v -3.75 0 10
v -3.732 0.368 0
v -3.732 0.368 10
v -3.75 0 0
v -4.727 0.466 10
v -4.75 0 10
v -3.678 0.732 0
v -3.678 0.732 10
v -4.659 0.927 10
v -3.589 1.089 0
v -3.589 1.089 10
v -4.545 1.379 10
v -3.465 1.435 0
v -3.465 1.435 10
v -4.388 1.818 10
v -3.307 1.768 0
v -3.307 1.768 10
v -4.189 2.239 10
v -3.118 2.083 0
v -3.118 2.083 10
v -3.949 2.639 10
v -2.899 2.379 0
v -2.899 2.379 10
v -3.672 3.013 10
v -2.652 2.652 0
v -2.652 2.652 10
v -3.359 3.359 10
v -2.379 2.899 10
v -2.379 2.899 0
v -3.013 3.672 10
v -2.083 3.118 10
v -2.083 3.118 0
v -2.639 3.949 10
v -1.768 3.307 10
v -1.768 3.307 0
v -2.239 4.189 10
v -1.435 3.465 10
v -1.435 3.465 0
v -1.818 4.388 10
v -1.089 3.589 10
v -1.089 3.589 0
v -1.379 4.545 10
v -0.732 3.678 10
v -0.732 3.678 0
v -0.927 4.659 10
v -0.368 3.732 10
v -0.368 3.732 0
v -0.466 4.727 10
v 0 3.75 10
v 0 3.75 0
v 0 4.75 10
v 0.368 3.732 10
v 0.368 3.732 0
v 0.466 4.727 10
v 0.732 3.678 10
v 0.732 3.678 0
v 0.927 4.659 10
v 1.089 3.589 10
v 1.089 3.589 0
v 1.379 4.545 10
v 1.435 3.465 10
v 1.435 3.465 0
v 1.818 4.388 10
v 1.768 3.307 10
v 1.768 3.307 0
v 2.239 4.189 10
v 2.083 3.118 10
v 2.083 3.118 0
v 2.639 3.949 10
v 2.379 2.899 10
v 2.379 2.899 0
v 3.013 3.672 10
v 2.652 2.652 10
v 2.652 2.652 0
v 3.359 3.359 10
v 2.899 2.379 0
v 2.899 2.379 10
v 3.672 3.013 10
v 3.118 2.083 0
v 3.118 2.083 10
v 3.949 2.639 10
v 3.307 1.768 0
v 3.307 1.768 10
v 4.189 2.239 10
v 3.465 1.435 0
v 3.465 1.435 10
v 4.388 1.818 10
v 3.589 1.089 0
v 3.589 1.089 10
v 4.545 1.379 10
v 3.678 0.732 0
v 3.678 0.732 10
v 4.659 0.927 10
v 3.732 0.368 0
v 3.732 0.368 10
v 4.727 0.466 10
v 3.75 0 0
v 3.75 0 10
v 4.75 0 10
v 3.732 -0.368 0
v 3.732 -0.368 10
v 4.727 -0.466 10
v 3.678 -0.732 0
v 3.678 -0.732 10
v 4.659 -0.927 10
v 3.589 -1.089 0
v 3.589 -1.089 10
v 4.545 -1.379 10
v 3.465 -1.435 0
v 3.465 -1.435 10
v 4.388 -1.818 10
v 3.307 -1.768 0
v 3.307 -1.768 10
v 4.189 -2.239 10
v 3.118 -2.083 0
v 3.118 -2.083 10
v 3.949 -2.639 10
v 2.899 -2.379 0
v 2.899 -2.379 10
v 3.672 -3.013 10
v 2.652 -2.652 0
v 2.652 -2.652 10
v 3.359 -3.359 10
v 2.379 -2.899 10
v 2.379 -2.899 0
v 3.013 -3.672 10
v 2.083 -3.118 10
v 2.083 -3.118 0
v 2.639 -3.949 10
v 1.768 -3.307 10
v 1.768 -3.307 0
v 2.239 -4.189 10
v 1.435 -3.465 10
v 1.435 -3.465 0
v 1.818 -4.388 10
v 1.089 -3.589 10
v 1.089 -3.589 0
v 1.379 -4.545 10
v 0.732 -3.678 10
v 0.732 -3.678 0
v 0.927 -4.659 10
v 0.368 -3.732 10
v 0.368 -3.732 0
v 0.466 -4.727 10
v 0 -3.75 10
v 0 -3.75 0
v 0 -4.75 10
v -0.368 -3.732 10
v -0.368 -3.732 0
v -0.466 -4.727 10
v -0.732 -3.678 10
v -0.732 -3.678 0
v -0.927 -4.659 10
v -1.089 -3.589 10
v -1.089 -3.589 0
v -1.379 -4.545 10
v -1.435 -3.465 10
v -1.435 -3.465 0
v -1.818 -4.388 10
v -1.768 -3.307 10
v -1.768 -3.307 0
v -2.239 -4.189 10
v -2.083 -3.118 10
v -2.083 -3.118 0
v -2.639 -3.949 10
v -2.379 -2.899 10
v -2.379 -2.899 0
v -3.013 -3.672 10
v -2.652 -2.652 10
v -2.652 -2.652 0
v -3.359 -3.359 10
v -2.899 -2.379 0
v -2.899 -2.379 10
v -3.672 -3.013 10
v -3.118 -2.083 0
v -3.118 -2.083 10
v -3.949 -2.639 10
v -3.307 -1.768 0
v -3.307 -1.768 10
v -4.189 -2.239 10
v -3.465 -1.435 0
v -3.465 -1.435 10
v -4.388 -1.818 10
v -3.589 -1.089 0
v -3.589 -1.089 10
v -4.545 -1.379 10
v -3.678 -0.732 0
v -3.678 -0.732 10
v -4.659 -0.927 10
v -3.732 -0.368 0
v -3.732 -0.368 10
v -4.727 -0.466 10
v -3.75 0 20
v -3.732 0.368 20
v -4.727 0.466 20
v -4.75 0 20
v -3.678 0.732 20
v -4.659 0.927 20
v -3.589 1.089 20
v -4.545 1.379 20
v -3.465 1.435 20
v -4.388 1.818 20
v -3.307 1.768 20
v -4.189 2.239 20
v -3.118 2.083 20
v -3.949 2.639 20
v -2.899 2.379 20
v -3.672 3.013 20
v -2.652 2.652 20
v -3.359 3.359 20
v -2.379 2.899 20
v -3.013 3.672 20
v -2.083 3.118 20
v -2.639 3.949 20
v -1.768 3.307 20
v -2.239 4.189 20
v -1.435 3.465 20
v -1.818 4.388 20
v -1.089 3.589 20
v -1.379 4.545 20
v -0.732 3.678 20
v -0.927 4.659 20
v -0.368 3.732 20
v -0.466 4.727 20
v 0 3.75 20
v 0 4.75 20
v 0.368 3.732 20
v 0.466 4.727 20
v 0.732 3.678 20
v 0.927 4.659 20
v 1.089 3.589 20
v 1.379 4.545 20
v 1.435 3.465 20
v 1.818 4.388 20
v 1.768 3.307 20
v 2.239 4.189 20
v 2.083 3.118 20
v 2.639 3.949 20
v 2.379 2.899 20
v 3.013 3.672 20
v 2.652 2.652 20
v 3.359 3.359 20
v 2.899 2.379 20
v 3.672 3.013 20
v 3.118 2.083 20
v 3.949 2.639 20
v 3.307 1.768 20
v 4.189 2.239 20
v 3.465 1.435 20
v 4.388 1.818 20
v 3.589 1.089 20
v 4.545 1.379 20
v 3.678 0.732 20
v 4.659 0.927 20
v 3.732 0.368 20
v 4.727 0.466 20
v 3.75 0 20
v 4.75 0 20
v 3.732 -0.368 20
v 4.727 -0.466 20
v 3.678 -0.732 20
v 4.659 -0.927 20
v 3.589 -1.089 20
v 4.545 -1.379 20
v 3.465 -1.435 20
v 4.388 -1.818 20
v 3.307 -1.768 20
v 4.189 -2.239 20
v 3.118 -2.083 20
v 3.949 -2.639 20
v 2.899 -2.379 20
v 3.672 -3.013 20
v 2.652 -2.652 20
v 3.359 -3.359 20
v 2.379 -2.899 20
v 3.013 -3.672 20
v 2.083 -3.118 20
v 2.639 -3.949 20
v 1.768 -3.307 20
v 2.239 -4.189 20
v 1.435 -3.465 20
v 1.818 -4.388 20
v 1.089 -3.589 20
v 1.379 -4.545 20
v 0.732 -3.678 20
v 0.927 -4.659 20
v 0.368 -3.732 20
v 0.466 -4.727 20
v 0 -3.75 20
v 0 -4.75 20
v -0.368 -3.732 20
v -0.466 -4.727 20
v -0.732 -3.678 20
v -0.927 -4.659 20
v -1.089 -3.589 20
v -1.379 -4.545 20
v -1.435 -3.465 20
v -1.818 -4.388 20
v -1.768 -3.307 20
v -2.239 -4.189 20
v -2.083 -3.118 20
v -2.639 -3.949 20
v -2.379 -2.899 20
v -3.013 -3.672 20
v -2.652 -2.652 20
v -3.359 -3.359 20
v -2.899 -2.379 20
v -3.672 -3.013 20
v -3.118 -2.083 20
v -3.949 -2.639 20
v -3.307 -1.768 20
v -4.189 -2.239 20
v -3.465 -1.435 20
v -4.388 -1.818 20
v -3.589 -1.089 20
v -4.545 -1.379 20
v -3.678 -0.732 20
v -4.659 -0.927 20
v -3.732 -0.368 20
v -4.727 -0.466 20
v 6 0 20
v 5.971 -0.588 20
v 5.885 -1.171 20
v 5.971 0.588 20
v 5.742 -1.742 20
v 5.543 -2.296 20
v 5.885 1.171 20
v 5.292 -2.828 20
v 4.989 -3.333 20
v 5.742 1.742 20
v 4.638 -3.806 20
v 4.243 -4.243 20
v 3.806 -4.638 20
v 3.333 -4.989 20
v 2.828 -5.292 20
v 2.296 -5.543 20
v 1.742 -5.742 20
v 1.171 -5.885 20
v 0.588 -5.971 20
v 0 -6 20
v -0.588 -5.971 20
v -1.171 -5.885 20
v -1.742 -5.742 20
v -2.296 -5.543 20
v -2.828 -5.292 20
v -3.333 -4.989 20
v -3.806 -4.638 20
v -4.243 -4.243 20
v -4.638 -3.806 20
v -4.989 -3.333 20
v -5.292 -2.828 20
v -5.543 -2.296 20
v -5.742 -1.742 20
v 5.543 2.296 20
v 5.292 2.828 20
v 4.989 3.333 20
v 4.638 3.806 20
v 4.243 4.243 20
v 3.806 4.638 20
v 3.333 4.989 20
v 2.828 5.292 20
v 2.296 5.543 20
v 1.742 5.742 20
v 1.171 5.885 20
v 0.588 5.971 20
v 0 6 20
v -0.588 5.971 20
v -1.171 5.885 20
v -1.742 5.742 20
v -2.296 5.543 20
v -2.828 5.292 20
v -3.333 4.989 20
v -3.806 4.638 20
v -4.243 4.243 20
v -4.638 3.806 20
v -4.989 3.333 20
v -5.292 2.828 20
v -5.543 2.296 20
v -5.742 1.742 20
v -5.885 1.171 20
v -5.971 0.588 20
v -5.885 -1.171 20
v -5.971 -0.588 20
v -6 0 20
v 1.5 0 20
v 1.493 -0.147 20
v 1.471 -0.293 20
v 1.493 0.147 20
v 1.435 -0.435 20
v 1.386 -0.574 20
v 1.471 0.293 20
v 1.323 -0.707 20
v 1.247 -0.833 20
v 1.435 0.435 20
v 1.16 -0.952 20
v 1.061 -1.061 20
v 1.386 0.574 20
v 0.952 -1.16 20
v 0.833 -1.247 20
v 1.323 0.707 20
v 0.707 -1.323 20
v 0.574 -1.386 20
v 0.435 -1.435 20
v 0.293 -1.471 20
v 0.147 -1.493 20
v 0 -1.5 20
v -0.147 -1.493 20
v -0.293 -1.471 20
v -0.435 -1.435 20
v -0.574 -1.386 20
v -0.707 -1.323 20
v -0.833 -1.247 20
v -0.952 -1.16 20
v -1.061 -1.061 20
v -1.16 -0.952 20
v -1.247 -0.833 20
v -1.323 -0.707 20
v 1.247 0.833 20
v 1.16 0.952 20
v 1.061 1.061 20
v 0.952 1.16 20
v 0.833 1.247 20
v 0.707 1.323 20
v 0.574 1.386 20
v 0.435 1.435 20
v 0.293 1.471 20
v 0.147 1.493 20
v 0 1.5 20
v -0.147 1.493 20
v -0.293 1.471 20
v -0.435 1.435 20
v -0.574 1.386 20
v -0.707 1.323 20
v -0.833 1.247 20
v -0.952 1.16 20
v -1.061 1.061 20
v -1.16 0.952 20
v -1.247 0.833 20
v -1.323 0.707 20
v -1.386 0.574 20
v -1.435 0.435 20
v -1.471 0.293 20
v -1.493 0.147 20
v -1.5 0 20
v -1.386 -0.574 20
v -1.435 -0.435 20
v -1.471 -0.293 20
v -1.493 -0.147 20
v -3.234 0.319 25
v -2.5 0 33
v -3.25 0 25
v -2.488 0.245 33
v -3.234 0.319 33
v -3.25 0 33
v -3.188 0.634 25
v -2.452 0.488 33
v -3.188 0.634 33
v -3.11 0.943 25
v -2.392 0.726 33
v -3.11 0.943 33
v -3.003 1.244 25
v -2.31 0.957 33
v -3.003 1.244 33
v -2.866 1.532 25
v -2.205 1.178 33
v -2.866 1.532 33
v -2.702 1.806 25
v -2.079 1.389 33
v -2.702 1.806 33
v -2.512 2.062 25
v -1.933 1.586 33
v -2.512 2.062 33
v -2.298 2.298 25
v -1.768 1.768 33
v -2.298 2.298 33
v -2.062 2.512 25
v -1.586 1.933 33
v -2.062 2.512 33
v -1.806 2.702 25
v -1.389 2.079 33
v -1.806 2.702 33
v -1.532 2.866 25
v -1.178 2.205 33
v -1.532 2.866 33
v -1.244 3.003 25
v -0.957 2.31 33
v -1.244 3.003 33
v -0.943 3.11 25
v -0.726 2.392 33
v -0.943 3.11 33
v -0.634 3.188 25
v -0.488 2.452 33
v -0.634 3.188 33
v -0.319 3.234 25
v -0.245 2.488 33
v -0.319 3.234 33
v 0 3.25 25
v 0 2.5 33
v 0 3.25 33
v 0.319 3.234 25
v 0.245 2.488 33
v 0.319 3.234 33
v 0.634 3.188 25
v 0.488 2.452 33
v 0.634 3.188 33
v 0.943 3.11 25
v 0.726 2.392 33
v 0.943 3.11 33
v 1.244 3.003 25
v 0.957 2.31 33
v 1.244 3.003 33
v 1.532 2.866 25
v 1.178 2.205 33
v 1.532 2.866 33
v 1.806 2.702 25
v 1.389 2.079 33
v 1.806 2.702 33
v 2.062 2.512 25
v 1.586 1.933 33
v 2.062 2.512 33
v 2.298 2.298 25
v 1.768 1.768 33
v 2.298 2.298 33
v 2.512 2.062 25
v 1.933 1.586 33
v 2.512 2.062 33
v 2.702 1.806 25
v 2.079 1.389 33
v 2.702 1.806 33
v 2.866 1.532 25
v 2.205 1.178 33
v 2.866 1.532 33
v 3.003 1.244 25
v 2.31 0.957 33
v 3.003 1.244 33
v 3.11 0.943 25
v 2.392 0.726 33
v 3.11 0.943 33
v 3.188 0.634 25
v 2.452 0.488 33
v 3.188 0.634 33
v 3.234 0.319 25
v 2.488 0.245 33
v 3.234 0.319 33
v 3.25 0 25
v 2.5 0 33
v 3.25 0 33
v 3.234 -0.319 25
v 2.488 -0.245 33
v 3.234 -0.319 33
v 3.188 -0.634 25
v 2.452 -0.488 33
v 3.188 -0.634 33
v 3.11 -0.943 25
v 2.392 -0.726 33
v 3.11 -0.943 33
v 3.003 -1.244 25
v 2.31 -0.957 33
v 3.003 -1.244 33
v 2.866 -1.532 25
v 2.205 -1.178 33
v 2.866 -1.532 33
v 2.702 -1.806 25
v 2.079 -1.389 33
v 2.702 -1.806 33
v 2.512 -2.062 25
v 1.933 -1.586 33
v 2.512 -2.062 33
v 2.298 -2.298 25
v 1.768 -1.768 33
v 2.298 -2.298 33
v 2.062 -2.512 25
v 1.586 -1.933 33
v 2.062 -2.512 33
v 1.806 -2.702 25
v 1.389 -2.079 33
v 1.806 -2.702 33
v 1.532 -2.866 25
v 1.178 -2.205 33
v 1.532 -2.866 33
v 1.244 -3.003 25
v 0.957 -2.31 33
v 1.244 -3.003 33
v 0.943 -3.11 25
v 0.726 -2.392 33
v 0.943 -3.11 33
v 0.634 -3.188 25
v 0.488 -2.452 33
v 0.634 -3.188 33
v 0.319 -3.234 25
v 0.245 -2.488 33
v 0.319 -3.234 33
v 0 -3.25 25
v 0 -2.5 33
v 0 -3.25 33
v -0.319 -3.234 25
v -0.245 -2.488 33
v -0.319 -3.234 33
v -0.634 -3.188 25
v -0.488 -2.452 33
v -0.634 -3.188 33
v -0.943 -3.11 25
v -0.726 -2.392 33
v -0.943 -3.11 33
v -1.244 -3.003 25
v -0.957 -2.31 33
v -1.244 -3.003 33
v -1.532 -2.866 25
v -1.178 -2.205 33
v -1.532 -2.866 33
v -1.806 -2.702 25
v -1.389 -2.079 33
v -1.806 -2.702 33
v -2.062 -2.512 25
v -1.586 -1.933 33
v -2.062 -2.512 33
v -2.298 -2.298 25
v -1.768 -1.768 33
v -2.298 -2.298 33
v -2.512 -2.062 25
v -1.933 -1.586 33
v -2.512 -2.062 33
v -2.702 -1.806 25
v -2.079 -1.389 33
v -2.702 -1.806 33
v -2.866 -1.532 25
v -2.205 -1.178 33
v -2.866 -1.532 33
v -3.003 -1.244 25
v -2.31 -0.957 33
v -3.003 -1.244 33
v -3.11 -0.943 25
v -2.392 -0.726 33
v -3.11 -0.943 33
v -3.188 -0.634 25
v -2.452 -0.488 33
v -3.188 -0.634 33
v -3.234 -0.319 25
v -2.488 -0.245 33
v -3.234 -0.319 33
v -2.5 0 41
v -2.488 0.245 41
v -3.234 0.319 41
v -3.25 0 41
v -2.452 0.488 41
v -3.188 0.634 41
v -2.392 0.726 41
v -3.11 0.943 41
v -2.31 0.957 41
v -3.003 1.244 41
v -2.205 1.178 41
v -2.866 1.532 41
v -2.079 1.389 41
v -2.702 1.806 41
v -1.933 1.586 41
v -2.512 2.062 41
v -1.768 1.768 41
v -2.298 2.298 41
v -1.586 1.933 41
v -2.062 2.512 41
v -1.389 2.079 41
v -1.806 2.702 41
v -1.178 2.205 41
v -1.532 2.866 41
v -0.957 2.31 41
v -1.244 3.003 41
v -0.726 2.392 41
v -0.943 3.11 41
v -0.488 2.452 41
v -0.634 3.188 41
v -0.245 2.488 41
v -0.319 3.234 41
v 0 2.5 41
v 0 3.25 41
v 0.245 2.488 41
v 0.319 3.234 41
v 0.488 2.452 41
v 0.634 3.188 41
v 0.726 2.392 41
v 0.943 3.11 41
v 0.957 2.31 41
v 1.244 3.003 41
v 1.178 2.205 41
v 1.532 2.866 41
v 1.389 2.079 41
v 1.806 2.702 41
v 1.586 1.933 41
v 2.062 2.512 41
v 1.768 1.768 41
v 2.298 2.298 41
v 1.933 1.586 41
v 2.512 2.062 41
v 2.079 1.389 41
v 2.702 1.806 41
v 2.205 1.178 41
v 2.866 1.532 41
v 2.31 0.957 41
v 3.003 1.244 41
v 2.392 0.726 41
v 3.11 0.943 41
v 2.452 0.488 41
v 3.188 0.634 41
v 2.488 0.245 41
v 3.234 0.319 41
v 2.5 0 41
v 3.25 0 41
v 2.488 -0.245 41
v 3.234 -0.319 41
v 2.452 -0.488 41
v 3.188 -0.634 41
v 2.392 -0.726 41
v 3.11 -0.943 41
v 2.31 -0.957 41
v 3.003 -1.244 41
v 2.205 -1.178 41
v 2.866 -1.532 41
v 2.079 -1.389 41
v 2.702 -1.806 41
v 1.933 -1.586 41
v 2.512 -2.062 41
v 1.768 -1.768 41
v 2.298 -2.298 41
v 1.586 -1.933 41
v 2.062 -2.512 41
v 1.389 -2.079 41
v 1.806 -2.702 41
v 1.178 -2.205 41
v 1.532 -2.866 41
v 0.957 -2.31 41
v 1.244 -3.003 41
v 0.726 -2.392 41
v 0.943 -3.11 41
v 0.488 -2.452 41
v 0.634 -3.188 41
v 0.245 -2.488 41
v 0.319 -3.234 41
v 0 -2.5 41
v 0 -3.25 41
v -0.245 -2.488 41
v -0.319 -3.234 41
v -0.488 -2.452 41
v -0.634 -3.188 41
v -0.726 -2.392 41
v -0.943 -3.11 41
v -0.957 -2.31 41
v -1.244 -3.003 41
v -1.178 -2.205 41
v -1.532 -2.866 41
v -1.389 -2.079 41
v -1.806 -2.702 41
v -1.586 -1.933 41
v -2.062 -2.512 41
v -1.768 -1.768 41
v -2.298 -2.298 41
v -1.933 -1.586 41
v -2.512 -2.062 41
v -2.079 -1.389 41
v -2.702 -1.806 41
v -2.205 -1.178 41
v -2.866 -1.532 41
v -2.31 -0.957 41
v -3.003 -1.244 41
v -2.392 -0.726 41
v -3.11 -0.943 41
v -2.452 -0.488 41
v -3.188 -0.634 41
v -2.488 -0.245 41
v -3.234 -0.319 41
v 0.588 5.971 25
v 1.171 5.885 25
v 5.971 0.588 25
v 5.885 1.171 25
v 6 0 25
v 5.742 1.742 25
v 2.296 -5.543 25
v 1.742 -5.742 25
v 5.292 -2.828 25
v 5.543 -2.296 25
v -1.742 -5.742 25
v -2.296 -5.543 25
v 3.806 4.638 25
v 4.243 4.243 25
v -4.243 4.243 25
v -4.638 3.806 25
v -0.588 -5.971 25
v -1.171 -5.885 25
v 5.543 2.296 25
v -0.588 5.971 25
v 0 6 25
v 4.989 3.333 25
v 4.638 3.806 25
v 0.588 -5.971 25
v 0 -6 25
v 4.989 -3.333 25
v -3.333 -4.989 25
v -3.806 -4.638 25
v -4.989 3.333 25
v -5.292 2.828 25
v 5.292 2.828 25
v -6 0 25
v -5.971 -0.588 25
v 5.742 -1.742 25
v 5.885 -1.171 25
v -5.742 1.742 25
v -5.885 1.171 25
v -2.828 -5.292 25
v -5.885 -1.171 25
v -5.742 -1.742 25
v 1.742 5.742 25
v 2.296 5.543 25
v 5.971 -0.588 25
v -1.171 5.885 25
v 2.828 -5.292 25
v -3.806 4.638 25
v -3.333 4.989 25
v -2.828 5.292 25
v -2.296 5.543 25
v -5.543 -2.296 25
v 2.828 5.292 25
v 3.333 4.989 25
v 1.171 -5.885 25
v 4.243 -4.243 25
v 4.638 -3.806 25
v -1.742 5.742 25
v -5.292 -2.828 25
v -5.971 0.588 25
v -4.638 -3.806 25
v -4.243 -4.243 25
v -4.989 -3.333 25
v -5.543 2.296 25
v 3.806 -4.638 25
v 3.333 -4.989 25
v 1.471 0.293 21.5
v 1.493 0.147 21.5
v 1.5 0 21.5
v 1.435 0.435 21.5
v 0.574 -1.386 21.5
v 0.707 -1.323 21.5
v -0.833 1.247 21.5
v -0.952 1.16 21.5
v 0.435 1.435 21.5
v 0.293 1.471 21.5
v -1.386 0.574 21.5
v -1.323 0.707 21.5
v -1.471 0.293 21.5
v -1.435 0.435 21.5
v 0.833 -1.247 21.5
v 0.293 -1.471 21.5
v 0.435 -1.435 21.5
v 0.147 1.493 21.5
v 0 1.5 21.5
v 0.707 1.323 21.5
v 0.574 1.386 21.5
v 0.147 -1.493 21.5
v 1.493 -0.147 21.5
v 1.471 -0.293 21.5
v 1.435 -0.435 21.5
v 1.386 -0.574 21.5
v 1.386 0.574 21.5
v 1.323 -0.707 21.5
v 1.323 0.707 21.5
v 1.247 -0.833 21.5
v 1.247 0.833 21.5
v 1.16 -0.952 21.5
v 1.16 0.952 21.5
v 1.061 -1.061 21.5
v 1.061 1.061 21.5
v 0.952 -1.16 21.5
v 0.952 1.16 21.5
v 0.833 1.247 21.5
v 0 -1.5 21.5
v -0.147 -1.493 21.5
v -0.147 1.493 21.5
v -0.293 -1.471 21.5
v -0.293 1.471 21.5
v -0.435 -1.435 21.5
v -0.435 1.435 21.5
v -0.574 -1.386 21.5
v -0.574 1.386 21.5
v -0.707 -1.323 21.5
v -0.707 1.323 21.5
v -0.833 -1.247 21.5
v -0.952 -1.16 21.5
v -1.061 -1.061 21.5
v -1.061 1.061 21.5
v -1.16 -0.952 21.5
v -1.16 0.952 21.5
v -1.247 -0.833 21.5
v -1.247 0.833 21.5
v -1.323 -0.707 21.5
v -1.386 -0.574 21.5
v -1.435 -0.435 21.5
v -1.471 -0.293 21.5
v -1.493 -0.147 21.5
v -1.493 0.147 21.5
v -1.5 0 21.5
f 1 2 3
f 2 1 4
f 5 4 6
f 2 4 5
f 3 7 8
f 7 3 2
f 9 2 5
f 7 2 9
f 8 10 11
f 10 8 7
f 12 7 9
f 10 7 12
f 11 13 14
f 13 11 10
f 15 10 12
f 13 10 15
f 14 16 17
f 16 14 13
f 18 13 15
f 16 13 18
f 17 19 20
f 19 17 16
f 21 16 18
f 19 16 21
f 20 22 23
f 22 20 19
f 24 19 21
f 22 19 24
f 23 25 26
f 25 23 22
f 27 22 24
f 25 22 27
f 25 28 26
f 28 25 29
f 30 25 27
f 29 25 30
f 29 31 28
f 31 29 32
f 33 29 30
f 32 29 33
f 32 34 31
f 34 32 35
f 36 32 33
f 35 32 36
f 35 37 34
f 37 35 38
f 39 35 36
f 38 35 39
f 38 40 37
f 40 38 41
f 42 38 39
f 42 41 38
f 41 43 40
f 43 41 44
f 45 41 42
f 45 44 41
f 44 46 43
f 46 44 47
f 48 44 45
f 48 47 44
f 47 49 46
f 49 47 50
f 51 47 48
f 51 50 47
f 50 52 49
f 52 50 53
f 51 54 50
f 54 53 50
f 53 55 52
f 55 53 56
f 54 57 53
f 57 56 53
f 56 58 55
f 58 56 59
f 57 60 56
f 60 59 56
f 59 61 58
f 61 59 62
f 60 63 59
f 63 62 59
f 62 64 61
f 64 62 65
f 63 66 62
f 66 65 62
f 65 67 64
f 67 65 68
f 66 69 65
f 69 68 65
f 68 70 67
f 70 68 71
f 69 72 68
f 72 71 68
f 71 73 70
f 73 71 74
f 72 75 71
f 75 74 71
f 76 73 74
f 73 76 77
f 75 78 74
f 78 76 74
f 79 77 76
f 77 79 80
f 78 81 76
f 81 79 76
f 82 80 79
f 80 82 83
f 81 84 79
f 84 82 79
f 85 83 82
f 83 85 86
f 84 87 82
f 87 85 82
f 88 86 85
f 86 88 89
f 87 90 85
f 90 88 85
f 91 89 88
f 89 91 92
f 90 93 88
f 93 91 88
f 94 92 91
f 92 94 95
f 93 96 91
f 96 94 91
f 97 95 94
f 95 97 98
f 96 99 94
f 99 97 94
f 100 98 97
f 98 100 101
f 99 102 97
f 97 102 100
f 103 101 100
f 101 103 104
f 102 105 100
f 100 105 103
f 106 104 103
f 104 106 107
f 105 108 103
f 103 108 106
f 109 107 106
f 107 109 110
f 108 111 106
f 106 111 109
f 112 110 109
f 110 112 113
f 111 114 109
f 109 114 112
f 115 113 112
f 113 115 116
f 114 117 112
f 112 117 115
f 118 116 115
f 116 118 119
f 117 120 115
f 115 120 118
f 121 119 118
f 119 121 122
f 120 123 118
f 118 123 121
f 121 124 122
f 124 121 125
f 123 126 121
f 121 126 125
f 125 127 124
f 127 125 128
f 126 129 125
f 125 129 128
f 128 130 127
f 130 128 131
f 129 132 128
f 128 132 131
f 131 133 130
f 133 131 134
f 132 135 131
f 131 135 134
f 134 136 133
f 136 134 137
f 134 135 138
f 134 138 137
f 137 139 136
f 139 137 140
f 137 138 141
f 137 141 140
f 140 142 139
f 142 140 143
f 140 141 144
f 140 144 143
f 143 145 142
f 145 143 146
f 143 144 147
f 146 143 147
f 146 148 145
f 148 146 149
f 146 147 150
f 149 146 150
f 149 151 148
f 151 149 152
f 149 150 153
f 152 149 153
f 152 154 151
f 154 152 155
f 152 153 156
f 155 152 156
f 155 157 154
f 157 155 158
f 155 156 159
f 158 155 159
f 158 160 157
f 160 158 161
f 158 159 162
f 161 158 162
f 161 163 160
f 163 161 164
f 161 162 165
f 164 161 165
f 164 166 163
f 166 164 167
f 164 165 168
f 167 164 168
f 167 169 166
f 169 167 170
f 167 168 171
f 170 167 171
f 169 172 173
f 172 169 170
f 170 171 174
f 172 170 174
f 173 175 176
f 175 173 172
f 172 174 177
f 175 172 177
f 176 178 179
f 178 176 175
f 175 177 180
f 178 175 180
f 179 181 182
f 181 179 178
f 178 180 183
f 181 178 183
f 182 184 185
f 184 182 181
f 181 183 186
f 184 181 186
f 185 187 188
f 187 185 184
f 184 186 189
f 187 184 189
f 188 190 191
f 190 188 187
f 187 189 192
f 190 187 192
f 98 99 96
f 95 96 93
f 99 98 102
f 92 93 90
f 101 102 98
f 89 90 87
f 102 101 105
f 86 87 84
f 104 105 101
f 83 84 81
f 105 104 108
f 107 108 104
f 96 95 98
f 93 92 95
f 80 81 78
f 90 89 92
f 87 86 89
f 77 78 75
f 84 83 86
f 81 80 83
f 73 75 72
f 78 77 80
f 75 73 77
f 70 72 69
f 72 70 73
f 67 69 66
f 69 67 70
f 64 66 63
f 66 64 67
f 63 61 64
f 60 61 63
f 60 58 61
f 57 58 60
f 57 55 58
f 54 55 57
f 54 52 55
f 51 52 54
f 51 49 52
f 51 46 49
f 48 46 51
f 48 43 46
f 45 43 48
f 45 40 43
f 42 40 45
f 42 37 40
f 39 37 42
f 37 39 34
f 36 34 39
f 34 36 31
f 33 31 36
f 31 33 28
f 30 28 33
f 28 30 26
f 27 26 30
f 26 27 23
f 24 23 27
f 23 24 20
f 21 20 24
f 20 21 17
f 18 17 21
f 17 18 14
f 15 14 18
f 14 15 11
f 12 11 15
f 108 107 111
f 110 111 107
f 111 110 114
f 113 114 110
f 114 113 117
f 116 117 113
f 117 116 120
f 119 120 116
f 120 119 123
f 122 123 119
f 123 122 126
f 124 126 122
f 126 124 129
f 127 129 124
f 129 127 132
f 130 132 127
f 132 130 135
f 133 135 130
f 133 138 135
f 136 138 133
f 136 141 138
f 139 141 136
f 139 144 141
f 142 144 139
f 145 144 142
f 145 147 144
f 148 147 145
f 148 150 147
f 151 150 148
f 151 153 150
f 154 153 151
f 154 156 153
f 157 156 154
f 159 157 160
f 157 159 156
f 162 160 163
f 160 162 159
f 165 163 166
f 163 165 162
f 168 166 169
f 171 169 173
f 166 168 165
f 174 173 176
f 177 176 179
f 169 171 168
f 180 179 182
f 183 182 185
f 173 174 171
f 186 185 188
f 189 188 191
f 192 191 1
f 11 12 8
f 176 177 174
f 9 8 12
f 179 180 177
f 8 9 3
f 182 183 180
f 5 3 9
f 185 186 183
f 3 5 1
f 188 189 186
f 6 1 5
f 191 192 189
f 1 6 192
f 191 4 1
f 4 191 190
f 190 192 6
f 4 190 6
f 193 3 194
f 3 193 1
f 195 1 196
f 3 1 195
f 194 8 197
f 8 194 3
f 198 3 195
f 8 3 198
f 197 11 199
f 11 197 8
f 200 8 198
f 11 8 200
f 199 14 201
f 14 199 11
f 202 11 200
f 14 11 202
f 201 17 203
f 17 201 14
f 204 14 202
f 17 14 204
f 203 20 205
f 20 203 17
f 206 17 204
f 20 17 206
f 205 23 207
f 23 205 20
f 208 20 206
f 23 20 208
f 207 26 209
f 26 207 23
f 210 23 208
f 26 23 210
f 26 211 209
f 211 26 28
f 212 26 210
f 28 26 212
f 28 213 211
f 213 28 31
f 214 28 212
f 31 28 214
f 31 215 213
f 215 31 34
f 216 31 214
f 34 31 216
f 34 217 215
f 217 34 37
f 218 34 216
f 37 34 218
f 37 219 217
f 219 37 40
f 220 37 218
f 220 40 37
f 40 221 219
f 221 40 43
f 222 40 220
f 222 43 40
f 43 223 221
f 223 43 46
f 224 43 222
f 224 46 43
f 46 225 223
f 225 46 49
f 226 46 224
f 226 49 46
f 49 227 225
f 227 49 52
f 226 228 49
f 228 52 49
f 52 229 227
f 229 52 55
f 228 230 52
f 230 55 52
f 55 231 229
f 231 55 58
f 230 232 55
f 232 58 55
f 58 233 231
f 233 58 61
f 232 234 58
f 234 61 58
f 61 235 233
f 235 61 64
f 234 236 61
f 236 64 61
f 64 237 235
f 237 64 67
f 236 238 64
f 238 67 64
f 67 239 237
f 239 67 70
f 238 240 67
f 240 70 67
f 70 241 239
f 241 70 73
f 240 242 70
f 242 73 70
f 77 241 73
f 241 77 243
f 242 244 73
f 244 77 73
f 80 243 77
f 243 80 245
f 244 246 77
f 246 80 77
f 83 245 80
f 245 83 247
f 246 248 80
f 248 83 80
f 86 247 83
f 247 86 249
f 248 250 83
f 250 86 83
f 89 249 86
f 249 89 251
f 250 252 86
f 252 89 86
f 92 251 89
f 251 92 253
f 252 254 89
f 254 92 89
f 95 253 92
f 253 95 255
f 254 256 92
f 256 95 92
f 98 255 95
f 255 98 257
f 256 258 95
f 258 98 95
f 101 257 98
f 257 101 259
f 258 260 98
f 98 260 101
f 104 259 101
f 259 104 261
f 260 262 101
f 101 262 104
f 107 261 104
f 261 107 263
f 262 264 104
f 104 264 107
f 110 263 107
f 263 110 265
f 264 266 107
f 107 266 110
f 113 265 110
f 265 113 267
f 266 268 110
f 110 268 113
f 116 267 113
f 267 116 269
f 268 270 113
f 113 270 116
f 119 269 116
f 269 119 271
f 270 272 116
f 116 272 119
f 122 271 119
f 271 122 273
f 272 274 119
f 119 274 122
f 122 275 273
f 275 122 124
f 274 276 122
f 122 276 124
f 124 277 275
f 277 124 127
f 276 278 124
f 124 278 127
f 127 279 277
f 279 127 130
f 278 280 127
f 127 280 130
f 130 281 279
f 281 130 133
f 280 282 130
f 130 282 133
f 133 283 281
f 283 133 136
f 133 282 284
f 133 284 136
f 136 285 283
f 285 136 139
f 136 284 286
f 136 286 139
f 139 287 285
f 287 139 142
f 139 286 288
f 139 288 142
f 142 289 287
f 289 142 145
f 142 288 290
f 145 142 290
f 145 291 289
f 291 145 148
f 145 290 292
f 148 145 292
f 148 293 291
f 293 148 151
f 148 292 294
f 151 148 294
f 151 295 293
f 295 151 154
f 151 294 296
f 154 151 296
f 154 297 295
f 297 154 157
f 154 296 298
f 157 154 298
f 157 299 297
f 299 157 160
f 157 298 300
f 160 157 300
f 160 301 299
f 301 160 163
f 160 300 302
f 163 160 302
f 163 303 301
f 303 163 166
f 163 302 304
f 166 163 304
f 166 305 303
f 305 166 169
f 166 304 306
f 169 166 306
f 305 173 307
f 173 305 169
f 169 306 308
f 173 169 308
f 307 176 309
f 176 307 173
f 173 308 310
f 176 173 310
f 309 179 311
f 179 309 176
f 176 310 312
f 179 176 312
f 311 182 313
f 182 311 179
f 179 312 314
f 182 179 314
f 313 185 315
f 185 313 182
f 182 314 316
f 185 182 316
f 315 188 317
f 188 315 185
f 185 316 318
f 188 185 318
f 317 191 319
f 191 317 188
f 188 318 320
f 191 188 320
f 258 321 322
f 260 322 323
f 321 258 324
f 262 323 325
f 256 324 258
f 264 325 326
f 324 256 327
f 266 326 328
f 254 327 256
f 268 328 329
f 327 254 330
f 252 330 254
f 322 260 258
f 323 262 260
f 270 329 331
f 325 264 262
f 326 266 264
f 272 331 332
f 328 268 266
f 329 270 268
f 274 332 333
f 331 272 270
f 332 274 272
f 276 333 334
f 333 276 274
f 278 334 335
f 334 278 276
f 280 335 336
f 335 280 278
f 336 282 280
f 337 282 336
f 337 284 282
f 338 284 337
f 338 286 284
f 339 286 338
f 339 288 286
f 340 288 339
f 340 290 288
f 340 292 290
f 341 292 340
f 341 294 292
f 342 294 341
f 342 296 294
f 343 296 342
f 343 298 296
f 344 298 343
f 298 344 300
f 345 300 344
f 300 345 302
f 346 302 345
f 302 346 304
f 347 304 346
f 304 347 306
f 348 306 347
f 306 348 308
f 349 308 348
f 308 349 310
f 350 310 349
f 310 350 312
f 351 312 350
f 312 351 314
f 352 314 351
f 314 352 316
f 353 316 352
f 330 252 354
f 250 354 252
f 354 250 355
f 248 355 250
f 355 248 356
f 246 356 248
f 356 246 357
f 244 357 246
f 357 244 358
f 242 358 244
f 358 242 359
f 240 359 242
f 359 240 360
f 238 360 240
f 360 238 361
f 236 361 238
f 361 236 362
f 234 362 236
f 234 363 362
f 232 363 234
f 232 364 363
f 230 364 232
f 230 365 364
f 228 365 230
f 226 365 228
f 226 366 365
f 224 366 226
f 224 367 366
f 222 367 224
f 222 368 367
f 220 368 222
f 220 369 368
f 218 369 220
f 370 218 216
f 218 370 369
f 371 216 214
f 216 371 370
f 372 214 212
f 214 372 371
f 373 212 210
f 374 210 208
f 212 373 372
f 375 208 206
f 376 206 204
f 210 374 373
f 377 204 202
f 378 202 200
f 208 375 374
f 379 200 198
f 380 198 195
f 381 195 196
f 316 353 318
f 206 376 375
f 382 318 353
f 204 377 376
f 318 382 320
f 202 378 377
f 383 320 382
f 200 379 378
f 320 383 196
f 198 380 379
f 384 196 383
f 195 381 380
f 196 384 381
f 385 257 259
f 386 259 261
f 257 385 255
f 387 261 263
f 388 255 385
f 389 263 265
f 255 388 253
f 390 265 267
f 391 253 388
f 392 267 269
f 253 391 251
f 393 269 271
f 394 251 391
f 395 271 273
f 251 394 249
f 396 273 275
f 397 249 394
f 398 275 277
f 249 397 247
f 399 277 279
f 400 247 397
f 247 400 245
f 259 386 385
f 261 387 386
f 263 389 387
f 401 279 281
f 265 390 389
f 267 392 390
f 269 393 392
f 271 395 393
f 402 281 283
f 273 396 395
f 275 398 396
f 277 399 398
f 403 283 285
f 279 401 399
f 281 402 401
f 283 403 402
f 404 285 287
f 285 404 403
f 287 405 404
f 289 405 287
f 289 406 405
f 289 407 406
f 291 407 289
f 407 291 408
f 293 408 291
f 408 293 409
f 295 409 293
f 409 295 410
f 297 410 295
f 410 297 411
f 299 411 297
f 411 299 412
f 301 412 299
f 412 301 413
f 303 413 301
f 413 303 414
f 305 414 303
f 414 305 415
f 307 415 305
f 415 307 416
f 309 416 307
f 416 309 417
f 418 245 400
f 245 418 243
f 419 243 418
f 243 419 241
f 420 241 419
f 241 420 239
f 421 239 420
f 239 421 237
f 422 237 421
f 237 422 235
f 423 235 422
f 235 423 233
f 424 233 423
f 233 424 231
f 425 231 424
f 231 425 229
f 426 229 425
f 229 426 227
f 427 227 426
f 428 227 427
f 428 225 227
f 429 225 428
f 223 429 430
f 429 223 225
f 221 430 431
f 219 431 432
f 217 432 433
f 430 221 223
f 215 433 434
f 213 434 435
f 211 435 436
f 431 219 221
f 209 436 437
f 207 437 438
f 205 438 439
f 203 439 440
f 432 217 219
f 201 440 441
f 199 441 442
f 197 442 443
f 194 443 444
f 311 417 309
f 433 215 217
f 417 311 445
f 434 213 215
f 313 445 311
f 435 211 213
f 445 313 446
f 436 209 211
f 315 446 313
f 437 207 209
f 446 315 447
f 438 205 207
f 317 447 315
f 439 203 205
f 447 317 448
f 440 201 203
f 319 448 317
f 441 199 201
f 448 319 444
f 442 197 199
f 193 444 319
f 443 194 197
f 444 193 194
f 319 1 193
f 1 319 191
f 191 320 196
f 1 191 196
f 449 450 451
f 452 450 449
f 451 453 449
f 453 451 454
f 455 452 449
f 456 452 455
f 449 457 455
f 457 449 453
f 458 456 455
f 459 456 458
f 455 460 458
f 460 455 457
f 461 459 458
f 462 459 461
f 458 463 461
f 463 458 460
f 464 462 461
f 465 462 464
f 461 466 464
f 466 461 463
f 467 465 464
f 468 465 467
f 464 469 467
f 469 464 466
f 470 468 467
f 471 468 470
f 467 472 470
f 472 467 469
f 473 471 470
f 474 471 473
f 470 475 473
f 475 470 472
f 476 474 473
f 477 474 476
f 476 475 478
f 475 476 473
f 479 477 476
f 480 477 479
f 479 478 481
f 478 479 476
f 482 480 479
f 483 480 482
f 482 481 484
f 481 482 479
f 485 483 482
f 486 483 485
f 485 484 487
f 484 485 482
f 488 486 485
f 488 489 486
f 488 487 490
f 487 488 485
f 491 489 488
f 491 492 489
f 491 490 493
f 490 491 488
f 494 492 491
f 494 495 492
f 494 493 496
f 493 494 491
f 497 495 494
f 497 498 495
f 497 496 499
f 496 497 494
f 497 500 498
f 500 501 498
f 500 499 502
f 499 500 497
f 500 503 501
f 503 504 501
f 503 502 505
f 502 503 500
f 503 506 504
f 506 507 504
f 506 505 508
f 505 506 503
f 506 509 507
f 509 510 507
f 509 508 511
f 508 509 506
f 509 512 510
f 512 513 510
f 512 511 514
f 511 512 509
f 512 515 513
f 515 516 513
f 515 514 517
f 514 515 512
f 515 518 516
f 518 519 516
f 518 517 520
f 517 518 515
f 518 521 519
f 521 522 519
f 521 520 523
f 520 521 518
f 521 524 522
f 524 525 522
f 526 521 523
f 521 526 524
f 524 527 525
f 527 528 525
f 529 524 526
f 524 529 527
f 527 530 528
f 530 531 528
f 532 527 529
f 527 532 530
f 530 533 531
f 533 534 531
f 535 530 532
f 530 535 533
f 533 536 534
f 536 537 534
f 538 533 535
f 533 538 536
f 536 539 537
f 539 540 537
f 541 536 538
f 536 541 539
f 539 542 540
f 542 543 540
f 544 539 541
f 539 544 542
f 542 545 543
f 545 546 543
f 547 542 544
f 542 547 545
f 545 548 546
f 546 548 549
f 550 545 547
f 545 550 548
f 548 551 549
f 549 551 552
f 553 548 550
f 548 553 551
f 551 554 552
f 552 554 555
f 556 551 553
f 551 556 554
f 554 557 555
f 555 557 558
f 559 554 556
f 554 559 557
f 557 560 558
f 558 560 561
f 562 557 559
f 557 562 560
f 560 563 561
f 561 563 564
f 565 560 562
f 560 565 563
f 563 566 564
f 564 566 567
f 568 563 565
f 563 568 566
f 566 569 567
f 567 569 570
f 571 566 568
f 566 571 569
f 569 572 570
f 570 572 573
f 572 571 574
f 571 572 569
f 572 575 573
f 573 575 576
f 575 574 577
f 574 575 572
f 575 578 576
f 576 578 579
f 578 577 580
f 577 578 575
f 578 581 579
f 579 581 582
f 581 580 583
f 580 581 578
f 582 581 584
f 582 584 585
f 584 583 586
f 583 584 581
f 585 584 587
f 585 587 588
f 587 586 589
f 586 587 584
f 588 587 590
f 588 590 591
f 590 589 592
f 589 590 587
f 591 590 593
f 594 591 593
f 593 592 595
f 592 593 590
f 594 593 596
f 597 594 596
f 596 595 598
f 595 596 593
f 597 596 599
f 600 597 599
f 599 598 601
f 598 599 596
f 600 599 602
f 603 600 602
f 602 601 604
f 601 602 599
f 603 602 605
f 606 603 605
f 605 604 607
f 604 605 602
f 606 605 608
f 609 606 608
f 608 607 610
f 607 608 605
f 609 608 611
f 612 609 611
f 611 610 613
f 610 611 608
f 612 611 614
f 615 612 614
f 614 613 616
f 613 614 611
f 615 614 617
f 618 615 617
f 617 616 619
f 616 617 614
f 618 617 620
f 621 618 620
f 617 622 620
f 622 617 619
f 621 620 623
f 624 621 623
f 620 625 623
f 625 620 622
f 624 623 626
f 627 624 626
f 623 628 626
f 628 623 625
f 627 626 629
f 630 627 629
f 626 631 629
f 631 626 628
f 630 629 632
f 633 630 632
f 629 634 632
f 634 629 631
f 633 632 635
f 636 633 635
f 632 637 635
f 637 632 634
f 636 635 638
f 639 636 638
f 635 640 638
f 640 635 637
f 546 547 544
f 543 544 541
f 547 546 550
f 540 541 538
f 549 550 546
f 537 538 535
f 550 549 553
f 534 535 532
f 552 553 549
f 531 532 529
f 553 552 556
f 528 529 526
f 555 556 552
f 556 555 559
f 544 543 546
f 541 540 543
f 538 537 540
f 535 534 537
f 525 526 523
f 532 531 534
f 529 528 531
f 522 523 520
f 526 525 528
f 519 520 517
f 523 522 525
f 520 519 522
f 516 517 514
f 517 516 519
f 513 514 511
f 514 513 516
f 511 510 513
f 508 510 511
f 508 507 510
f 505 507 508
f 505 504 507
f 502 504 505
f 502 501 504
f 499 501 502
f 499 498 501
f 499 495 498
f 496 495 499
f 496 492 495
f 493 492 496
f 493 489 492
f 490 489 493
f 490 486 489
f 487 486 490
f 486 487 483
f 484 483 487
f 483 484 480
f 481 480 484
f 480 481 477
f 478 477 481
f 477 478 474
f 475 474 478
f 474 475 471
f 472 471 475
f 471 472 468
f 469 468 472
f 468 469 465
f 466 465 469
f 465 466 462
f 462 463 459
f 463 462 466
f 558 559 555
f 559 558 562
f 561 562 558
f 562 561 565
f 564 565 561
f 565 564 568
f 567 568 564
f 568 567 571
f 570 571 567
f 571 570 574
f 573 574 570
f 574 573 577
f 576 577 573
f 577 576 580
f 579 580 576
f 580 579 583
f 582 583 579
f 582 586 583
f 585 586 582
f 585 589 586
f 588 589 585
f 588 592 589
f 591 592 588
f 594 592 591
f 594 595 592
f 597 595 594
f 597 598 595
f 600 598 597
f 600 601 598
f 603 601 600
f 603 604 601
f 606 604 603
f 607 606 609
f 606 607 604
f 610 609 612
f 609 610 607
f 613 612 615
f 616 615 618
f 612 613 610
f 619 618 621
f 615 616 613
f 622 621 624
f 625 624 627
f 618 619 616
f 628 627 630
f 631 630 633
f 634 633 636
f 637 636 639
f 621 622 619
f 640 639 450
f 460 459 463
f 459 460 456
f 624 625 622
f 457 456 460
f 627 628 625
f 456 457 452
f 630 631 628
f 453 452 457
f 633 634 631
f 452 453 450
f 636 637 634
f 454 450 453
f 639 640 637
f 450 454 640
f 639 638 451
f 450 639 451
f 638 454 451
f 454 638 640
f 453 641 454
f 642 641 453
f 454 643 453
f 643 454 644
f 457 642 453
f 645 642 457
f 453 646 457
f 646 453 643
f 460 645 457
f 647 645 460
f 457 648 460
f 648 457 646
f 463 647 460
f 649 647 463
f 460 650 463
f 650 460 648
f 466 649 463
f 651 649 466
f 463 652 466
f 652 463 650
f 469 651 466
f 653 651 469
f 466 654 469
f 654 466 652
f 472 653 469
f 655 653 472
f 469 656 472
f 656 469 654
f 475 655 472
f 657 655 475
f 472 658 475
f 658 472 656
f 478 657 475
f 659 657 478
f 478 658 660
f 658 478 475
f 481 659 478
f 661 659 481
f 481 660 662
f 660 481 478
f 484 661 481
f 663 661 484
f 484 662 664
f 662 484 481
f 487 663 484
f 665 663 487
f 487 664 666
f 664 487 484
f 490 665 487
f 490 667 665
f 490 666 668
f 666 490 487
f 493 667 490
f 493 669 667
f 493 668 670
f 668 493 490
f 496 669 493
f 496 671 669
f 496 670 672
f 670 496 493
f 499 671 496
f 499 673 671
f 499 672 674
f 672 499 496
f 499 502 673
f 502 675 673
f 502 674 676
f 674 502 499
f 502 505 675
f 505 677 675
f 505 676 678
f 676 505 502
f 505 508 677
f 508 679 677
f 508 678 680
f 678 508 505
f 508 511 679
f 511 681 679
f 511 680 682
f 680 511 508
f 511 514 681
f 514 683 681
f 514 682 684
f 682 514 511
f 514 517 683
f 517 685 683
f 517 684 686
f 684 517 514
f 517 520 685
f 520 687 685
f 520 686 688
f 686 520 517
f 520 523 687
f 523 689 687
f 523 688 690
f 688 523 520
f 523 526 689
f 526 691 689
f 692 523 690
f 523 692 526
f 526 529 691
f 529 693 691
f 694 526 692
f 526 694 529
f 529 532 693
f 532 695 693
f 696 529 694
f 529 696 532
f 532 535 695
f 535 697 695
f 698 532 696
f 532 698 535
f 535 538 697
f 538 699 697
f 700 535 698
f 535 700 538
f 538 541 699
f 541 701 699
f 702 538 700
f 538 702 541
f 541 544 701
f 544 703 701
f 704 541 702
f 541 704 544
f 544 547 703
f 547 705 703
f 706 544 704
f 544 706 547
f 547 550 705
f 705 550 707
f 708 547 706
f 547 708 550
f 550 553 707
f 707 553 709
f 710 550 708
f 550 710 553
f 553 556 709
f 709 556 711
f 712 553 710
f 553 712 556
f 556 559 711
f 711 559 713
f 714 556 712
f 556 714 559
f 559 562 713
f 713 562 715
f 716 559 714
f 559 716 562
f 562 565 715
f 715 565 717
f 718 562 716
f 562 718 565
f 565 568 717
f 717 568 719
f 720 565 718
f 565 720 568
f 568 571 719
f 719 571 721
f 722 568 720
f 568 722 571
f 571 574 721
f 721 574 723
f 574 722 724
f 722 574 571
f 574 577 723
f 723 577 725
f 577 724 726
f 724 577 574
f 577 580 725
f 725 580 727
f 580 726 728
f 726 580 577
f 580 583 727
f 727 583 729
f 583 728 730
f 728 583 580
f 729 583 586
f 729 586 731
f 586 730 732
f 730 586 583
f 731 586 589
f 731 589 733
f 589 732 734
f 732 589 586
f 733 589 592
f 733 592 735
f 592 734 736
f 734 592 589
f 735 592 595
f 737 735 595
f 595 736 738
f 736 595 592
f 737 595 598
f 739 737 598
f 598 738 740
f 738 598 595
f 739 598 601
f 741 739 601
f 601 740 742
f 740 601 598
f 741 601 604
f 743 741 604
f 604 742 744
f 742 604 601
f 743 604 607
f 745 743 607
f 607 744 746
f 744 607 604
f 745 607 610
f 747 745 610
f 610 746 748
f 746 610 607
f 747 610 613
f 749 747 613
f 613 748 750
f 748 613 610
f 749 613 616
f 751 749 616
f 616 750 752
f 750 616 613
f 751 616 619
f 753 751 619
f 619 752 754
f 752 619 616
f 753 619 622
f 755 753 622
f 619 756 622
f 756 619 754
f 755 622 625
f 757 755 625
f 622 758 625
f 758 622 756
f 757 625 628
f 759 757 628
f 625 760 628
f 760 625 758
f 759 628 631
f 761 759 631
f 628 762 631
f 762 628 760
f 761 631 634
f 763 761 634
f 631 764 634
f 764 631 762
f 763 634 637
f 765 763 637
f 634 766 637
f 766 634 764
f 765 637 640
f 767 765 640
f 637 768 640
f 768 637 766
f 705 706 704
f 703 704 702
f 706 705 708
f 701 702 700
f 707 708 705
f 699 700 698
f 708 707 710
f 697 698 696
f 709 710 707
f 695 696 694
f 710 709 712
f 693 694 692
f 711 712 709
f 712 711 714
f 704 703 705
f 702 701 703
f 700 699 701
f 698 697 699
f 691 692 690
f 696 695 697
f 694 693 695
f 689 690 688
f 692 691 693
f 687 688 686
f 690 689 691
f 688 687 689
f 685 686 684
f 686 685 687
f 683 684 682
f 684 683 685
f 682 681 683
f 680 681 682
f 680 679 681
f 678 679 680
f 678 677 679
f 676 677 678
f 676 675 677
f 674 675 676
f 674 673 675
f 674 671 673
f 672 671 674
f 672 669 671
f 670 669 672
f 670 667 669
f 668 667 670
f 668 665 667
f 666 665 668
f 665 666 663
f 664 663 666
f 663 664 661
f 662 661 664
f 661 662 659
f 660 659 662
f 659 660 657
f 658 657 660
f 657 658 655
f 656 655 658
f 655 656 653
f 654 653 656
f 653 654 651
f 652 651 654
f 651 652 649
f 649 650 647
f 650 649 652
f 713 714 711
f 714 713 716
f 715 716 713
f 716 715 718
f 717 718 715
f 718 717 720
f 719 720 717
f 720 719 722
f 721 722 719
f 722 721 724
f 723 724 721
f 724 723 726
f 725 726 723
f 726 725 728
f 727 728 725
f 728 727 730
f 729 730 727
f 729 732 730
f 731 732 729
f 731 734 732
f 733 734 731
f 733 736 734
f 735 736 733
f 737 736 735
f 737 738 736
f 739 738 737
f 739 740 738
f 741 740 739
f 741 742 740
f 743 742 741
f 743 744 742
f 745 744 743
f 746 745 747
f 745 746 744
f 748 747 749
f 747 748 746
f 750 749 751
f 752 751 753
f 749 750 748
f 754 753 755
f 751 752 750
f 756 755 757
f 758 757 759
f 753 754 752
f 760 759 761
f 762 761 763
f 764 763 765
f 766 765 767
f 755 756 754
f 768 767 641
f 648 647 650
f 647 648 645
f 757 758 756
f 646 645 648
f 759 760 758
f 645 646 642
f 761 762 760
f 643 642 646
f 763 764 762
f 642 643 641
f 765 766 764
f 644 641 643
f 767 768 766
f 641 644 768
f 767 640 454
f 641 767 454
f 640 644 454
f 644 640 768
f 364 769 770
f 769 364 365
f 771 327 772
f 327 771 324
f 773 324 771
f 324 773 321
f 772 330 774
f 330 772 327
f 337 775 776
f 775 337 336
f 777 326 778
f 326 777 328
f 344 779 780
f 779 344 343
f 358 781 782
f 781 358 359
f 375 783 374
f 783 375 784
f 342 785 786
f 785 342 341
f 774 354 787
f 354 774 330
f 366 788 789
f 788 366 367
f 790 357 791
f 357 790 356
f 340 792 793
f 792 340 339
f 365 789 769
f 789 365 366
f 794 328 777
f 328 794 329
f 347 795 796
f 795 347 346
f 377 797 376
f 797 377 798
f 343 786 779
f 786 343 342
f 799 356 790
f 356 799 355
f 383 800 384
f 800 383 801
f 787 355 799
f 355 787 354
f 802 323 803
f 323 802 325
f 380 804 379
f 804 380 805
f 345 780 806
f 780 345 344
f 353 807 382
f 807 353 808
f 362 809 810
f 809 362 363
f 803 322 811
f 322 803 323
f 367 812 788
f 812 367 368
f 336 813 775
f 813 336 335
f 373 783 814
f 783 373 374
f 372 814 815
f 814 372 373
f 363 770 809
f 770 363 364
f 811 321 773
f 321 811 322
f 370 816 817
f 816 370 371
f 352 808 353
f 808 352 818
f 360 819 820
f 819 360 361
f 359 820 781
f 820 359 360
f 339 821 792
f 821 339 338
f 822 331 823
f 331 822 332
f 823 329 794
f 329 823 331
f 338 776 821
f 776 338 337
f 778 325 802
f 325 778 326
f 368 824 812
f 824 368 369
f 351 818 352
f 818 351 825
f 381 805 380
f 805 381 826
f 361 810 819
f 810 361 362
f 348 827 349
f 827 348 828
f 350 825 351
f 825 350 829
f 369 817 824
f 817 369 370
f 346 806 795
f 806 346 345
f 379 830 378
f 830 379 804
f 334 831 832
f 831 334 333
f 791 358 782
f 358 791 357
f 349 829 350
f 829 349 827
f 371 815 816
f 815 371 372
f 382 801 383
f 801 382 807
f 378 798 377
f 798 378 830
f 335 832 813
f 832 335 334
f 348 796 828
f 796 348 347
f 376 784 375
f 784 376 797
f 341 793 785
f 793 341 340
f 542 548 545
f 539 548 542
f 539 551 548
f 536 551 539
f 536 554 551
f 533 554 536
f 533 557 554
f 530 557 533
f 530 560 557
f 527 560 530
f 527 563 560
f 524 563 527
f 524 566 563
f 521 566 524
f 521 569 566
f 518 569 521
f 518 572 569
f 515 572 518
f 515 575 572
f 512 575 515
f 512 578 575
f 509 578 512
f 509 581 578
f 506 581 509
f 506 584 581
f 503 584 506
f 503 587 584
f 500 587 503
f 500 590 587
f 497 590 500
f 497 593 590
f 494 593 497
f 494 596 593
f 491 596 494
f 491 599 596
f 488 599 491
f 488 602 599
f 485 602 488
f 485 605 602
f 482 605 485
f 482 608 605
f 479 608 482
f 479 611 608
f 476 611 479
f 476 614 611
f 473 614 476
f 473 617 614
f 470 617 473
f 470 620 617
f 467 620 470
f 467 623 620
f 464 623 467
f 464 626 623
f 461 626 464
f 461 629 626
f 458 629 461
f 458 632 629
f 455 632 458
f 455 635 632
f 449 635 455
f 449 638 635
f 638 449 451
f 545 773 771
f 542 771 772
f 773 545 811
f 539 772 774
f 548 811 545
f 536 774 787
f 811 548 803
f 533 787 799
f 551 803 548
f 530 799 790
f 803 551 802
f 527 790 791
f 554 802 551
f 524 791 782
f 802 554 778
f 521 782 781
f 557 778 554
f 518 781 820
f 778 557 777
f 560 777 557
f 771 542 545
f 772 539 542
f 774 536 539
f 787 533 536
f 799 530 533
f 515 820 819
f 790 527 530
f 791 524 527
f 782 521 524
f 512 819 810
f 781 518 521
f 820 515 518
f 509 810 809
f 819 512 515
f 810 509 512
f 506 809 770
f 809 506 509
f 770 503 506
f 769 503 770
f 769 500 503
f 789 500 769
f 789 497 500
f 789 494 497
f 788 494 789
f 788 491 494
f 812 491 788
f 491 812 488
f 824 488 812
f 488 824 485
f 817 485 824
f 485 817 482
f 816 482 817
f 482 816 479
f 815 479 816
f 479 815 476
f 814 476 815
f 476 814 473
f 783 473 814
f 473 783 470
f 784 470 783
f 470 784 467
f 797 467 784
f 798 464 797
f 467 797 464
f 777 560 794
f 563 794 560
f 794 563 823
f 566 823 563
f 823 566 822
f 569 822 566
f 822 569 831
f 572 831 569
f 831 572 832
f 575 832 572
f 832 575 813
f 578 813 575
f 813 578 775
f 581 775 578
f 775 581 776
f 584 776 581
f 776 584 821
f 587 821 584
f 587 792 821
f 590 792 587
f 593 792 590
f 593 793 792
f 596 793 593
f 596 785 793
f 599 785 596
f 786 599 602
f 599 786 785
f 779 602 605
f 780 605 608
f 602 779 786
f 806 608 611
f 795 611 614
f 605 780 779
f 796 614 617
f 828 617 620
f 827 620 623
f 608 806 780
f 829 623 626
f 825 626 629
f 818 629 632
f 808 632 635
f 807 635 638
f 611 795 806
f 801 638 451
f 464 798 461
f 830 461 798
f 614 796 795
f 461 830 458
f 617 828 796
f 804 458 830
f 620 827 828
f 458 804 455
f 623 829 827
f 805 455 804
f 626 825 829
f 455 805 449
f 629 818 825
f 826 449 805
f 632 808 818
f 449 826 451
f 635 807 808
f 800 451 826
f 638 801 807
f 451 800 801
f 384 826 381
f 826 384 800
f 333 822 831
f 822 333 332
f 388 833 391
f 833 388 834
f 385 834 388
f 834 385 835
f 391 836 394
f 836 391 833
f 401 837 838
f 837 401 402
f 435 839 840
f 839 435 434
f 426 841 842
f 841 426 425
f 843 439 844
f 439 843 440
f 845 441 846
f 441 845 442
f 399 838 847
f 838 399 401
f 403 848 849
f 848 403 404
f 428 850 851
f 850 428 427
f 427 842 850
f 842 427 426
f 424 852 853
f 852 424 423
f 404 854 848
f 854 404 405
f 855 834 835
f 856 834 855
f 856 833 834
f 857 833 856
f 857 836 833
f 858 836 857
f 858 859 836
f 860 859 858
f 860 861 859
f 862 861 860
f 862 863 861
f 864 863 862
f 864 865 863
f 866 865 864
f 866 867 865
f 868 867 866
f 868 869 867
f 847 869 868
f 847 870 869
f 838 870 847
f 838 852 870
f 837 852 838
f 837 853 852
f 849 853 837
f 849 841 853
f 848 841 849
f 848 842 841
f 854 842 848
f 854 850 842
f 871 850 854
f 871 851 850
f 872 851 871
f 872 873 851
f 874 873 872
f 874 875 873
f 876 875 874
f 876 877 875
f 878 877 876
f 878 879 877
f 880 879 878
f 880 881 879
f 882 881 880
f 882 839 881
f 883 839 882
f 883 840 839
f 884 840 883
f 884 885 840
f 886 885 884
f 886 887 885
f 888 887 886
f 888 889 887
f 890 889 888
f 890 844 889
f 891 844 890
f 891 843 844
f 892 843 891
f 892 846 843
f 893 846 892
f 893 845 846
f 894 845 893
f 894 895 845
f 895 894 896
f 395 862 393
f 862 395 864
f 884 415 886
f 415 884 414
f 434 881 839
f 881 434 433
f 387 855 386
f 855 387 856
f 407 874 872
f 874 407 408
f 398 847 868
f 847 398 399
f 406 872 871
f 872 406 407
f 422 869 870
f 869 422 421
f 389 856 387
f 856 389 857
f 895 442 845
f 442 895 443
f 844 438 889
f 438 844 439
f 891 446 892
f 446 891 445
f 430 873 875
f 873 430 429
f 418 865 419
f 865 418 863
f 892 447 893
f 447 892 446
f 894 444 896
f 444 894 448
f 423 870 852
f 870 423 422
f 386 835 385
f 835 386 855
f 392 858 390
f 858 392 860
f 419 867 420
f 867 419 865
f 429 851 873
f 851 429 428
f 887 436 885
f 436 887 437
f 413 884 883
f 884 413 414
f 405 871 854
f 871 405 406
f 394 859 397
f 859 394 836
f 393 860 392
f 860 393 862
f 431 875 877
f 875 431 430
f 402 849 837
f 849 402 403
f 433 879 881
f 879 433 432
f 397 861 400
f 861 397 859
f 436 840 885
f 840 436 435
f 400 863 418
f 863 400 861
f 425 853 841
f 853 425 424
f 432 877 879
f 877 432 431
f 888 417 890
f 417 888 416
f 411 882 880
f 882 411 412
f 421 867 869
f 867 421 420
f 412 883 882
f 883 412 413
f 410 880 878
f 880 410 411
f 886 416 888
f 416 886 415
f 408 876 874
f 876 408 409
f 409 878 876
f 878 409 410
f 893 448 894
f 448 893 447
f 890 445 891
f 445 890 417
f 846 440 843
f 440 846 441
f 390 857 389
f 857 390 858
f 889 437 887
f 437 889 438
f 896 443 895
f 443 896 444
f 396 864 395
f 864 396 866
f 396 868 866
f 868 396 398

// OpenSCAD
// Hose Barb Reducer: 8mm ID to 5mm ID
// Designed for FDM printing, standing upright on Z axis.

// Global settings
$fn = 64; // High resolution for round holes

// --- Dimensions for 8mm Tubing Barbs (Bottom Section) ---
OD_8mm_bottom = 7.5;  // Outer diameter at base of barb
OD_8mm_top = 9.5;     // Outer diameter at peak of barb
Barb8_Height = 10;    // Height of each 8mm barb
Barb8_Count = 2;      // Number of barbs for 8mm side

// --- Dimensions for Collar (Middle Section) ---
Collar_Height = 5;    // Height of the collar (z=20 to z=25)
Collar_OD = 12;       // Outer diameter of the collar

// --- Dimensions for 5mm Tubing Barbs (Top Section) ---
OD_5mm_bottom = 6.5;  // Outer diameter at base of barb
OD_5mm_top = 5.0;     // Outer diameter at peak of barb
Barb5_Height = 8;     // Height of each 5mm barb
Barb5_Count = 2;      // Number of barbs for 5mm side

// --- Bore ---
Bore_Diameter = 3;    // Inner diameter of the through-hole

// --- Helper Module: Sawtooth Barb Profile ---
// Creates a single barb profile in 2D (XY plane)
// x_start: radius at bottom
// x_end: radius at top
// height: height of the barb
// direction: 1 for expanding (8mm side), -1 for contracting (5mm side)
module barb_profile(x_start, x_end, height) {
    // The profile is a trapezoid that steps back.
    // Points: (x_start, 0) -> (x_end, height) -> (x_start, height) -> (x_start, 0)
    // Note: For the 5mm side, x_start > x_end, so it shrinks then steps out.
    polygon(points = [
        [x_start, 0],
        [x_end, height],
        [x_start, height],
        [x_start, 0]
    ]);
}

// --- Main Body Construction ---
difference() {
    union() {
        // 1. Bottom Barbs (8mm tubing)
        // Located from z=0 to z=20
        for (i = [0 : Barb8_Count - 1]) {
            translate([0, 0, i * Barb8_Height]) {
                rotate_extrude() {
                    barb_profile(OD_8mm_bottom / 2, OD_8mm_top / 2, Barb8_Height);
                }
            }
        }

        // 2. Collar
        // Located from z=20 to z=25
        translate([0, 0, Barb8_Count * Barb8_Height]) {
            cylinder(h = Collar_Height, r = Collar_OD / 2, center = false);
        }

        // 3. Top Barbs (5mm tubing)
        // Located from z=25 to z=41
        // Base z for top barbs is 20 (end of bottom barbs) + 5 (collar) = 25
        base_z_top = Barb8_Count * Barb8_Height + Collar_Height;
        for (i = [0 : Barb5_Count - 1]) {
            translate([0, 0, base_z_top + i * Barb5_Height]) {
                rotate_extrude() {
                    barb_profile(OD_5mm_bottom / 2, OD_5mm_top / 2, Barb5_Height);
                }
            }
        }
    }

    // 4. Bore Hole
    // Runs through the entire length. 
    // Total height = 20 (bottom barbs) + 5 (collar) + 16 (top barbs) = 41 mm
    total_height = Barb8_Count * Barb8_Height + Collar_Height + Barb5_Count * Barb5_Height;
    // Extend hole slightly past top and bottom to ensure clean cut
    cylinder(h = total_height + 2, r = Bore_Diameter / 2, center = true);
}
